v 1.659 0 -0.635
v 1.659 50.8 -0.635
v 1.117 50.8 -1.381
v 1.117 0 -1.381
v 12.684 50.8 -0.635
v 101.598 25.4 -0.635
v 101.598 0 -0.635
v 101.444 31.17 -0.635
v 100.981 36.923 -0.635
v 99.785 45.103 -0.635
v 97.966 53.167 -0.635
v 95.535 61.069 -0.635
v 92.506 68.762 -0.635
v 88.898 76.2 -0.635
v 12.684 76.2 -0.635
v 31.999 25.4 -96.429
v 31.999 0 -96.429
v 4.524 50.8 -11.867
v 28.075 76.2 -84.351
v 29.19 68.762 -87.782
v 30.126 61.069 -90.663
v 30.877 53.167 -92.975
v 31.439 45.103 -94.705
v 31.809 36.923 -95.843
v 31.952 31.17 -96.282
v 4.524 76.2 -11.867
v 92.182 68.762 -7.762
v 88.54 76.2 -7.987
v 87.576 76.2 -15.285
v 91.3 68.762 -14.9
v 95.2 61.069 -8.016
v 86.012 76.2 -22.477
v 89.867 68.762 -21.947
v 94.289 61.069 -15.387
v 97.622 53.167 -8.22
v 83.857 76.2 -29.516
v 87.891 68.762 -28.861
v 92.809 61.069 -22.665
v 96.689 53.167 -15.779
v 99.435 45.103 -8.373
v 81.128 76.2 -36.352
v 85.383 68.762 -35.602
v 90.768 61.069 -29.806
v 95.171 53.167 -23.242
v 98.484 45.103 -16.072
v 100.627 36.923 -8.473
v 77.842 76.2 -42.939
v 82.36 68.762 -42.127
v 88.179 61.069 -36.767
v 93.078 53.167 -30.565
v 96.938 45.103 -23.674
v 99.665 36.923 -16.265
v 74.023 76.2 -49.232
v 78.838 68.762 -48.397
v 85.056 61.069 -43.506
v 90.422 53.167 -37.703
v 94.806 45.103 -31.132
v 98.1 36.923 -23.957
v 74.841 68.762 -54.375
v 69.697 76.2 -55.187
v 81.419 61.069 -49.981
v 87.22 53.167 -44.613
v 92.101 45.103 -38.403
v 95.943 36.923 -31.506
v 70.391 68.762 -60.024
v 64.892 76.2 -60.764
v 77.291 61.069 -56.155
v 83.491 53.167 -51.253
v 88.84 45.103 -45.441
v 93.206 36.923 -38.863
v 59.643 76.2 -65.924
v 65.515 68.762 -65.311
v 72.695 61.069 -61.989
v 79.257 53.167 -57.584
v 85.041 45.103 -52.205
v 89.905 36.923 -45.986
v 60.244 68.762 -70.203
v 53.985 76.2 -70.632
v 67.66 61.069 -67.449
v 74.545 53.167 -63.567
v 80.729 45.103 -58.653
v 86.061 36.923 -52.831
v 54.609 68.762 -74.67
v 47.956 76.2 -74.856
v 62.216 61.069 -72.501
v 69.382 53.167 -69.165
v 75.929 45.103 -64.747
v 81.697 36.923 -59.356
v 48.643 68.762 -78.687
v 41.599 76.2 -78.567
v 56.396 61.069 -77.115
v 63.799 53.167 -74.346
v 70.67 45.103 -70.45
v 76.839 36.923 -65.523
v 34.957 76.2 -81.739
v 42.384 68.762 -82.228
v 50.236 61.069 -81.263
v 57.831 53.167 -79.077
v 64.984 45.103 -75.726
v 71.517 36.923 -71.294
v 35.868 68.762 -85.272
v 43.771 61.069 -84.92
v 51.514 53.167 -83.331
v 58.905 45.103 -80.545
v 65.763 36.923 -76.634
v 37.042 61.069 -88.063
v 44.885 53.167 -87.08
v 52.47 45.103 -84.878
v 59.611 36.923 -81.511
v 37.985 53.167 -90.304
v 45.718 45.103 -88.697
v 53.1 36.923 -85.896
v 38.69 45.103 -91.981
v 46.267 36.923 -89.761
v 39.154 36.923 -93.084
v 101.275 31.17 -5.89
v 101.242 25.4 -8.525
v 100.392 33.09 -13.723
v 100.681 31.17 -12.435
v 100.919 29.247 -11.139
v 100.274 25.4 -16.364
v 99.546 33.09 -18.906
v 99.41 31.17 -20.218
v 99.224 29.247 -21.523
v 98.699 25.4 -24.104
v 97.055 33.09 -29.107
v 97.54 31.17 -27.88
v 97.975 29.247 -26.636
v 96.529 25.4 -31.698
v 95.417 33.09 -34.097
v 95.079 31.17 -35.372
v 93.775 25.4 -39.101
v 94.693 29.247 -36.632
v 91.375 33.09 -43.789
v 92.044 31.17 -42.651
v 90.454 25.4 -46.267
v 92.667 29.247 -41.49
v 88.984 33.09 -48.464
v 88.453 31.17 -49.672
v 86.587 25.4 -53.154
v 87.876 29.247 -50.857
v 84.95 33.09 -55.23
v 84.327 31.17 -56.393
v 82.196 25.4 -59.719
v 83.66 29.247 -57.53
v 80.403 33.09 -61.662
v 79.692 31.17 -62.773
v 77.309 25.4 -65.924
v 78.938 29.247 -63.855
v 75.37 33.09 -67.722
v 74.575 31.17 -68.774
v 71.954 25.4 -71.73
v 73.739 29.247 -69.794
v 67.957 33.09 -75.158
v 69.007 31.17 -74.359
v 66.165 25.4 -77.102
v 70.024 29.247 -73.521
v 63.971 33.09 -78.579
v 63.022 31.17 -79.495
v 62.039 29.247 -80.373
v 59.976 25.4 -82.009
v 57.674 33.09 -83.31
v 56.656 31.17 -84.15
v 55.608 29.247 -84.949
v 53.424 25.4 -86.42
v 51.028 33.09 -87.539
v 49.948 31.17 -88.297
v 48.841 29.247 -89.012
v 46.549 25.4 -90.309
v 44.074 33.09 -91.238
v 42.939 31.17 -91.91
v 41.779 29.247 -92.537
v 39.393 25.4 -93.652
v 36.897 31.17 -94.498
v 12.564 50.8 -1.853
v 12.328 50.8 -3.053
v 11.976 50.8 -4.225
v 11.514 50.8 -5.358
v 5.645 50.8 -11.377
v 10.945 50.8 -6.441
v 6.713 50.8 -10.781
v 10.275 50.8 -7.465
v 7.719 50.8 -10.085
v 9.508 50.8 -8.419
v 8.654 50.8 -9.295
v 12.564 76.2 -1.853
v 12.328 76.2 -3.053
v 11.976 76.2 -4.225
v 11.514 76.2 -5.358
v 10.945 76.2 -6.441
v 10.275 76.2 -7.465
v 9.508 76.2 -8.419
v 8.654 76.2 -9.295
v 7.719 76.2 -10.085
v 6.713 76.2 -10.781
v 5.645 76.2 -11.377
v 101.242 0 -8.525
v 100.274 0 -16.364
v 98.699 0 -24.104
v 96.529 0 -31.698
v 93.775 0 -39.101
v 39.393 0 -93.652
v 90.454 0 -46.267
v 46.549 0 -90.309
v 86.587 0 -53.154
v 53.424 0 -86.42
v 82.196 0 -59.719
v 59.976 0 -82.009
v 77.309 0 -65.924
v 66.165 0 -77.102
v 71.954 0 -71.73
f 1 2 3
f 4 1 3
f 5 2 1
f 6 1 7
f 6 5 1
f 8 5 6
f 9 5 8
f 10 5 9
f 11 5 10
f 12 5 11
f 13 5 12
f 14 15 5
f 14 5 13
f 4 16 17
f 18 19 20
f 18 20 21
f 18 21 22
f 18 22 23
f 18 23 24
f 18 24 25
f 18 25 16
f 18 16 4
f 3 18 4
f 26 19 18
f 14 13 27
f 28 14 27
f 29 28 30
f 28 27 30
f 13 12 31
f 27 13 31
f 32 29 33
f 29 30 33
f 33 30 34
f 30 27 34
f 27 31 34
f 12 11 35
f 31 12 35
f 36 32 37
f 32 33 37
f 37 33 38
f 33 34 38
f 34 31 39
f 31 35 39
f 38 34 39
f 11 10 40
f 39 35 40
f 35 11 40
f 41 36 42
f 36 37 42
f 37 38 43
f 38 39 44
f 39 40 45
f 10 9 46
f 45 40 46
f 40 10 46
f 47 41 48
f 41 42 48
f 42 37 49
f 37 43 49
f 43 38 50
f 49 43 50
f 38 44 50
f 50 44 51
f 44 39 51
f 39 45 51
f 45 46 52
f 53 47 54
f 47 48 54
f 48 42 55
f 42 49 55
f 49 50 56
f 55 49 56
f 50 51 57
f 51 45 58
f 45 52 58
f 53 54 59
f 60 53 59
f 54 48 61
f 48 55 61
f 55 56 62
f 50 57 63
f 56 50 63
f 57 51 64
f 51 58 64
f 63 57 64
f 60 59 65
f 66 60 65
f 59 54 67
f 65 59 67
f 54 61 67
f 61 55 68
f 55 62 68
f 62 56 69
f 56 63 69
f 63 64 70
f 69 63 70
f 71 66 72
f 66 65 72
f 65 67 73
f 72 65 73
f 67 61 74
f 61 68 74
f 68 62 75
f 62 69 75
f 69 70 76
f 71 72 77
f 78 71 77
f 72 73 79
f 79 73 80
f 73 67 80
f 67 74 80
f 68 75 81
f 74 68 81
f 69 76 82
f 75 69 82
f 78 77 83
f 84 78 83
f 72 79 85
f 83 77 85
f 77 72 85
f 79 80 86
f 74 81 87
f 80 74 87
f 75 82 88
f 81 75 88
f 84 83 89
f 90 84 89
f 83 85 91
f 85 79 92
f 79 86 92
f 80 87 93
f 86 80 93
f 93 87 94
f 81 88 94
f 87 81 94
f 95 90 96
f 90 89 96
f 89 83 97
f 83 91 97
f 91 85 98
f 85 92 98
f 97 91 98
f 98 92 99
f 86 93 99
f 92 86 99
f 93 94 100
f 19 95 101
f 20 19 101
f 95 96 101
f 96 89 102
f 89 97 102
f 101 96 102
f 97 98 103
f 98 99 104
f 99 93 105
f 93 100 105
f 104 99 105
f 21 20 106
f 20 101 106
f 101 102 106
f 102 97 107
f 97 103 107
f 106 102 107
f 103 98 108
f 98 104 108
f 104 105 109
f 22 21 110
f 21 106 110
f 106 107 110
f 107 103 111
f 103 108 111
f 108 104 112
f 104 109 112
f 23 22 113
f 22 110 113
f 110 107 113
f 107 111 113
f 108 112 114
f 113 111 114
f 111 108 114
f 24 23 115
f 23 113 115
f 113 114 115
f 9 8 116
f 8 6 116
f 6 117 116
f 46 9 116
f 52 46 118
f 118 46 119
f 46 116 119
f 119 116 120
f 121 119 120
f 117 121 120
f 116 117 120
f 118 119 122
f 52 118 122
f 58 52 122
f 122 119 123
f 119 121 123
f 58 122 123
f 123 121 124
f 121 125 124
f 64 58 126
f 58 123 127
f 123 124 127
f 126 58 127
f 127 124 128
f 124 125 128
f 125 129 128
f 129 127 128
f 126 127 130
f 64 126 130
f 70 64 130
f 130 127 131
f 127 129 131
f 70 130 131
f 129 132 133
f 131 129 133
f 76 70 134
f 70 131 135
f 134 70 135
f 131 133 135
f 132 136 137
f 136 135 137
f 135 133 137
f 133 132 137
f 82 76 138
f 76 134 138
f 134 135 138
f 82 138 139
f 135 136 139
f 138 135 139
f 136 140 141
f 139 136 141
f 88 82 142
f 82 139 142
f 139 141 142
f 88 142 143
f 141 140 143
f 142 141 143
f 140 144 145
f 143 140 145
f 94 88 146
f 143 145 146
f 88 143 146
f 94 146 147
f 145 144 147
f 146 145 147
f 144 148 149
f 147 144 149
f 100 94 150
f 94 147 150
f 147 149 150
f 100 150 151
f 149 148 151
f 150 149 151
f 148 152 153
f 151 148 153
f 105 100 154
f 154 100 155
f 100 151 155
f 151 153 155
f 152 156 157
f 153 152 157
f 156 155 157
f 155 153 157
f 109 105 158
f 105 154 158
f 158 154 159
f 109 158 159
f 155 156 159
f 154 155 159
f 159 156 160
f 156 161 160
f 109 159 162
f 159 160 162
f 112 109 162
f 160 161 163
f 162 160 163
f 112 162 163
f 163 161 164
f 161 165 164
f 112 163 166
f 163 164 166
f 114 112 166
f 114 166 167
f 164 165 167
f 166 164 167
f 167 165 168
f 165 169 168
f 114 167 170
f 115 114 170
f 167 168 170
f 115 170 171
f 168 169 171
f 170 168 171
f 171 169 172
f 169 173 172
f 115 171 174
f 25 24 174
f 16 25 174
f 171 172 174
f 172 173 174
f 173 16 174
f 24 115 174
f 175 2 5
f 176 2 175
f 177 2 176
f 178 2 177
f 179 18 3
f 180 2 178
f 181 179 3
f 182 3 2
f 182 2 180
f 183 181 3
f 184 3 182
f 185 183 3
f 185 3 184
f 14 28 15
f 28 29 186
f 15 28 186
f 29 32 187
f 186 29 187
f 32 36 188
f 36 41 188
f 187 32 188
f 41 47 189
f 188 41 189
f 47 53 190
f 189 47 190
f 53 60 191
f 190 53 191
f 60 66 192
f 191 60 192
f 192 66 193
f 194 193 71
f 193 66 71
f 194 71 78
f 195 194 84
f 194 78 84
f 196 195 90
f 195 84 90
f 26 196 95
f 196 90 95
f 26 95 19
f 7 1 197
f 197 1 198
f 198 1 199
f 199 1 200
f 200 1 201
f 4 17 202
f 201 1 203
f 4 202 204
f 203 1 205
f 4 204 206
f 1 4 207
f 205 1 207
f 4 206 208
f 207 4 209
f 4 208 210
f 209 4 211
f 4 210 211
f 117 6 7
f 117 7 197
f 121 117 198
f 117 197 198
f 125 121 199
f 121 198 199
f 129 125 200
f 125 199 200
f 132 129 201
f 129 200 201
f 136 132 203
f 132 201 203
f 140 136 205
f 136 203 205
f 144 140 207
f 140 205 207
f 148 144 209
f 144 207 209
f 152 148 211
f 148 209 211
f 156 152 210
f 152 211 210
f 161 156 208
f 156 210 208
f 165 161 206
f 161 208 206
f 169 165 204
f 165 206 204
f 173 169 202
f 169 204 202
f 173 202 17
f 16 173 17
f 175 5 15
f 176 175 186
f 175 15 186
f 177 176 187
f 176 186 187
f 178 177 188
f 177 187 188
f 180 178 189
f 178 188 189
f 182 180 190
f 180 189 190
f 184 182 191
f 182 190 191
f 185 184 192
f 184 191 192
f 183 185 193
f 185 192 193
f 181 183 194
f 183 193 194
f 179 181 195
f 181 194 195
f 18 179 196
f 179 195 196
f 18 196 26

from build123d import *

# Parameters (mm, degrees)
REVOLVE1_ANGLE     = 72
CUT_EXTRUDE2_DEPTH = 0.635
CUT_EXTRUDE3_DEPTH = 0.635
SKETCH2_R          = 12.7
CUT_EXTRUDE1_DEPTH = 25.4
CUT_EXTRUDE4_REACH = 151.001


with BuildPart() as part:
    # Sketch1 → Revolve1 (revolve)
    with BuildSketch(Plane.XY):
        with BuildLine():
            Line((0, 0), (0, 76.2))
            Line((0, 76.2), (88.9, 76.2))
            ThreePointArc((88.9, 76.2), (98.376882891, 51.581720723), (101.6, 25.4))
            Line((101.6, 25.4), (101.6, 0))
            Line((101.6, 0), (0, 0))
        make_face()
    revolve(axis=Axis((0, 0, 0), (0, 1, 0)), revolution_arc=REVOLVE1_ANGLE)

    # Sketch3 → Cut-Extrude2 (cut)
    with BuildSketch(Plane(origin=(0, 0, 0), x_dir=(-0.3090169943749449, 0, 0.9510565162951544), z_dir=(-0.9510565162951544, 0, -0.3090169943749449))):
        with BuildLine():
            Line((0, 76.2), (-88.9, 76.2))
            ThreePointArc((-88.9, 76.2), (-98.376882891, 51.581720723), (-101.6, 25.4))
            Line((-101.6, 25.4), (-101.6, 0))
            Line((-101.6, 0), (0, 0))
            Line((0, 0), (0, 76.2))
        make_face()
    extrude(amount=-CUT_EXTRUDE2_DEPTH, mode=Mode.SUBTRACT)

    # Sketch4 → Cut-Extrude3 (cut)
    with BuildSketch(Plane.XY):
        with BuildLine():
            Line((0.667678512, 76.2), (0.667678512, 0))
            Line((0.667678512, 0), (101.6, 0))
            Line((101.6, 0), (101.6, 25.4))
            ThreePointArc((101.6, 25.4), (98.376882891, 51.581720723), (88.9, 76.2))
            Line((88.9, 76.2), (0.667678512, 76.2))
        make_face()
    extrude(amount=-CUT_EXTRUDE3_DEPTH, mode=Mode.SUBTRACT)

    # Sketch2 → Cut-Extrude1 (cut)
    with BuildSketch(Plane(origin=(0, 76.2, 0), x_dir=(1, 0, 0), z_dir=(0, 1, 0))):
        Circle(SKETCH2_R)
    extrude(amount=-CUT_EXTRUDE1_DEPTH, mode=Mode.SUBTRACT)

    # Sketch5 → Cut-Extrude4 (cut, up to next)
    with BuildSketch(Plane(origin=(0, 50.8, 0), x_dir=(1, 0, 0), z_dir=(0, 1, 0)), mode=Mode.PRIVATE) as cut_extrude4_sk1:
        Polygon((1.658905685, 0.635), (1.116550937, 1.38148727), (0.874002519, 0.635), align=None)
    cut_extrude4_tool1 = extrude(cut_extrude4_sk1.sketch, amount=-CUT_EXTRUDE4_REACH, mode=Mode.PRIVATE) & part.part
    add(cut_extrude4_tool1.solids().sort_by_distance((1.216486, 50.8, -0.883829))[0], mode=Mode.SUBTRACT)


solid = part.part
